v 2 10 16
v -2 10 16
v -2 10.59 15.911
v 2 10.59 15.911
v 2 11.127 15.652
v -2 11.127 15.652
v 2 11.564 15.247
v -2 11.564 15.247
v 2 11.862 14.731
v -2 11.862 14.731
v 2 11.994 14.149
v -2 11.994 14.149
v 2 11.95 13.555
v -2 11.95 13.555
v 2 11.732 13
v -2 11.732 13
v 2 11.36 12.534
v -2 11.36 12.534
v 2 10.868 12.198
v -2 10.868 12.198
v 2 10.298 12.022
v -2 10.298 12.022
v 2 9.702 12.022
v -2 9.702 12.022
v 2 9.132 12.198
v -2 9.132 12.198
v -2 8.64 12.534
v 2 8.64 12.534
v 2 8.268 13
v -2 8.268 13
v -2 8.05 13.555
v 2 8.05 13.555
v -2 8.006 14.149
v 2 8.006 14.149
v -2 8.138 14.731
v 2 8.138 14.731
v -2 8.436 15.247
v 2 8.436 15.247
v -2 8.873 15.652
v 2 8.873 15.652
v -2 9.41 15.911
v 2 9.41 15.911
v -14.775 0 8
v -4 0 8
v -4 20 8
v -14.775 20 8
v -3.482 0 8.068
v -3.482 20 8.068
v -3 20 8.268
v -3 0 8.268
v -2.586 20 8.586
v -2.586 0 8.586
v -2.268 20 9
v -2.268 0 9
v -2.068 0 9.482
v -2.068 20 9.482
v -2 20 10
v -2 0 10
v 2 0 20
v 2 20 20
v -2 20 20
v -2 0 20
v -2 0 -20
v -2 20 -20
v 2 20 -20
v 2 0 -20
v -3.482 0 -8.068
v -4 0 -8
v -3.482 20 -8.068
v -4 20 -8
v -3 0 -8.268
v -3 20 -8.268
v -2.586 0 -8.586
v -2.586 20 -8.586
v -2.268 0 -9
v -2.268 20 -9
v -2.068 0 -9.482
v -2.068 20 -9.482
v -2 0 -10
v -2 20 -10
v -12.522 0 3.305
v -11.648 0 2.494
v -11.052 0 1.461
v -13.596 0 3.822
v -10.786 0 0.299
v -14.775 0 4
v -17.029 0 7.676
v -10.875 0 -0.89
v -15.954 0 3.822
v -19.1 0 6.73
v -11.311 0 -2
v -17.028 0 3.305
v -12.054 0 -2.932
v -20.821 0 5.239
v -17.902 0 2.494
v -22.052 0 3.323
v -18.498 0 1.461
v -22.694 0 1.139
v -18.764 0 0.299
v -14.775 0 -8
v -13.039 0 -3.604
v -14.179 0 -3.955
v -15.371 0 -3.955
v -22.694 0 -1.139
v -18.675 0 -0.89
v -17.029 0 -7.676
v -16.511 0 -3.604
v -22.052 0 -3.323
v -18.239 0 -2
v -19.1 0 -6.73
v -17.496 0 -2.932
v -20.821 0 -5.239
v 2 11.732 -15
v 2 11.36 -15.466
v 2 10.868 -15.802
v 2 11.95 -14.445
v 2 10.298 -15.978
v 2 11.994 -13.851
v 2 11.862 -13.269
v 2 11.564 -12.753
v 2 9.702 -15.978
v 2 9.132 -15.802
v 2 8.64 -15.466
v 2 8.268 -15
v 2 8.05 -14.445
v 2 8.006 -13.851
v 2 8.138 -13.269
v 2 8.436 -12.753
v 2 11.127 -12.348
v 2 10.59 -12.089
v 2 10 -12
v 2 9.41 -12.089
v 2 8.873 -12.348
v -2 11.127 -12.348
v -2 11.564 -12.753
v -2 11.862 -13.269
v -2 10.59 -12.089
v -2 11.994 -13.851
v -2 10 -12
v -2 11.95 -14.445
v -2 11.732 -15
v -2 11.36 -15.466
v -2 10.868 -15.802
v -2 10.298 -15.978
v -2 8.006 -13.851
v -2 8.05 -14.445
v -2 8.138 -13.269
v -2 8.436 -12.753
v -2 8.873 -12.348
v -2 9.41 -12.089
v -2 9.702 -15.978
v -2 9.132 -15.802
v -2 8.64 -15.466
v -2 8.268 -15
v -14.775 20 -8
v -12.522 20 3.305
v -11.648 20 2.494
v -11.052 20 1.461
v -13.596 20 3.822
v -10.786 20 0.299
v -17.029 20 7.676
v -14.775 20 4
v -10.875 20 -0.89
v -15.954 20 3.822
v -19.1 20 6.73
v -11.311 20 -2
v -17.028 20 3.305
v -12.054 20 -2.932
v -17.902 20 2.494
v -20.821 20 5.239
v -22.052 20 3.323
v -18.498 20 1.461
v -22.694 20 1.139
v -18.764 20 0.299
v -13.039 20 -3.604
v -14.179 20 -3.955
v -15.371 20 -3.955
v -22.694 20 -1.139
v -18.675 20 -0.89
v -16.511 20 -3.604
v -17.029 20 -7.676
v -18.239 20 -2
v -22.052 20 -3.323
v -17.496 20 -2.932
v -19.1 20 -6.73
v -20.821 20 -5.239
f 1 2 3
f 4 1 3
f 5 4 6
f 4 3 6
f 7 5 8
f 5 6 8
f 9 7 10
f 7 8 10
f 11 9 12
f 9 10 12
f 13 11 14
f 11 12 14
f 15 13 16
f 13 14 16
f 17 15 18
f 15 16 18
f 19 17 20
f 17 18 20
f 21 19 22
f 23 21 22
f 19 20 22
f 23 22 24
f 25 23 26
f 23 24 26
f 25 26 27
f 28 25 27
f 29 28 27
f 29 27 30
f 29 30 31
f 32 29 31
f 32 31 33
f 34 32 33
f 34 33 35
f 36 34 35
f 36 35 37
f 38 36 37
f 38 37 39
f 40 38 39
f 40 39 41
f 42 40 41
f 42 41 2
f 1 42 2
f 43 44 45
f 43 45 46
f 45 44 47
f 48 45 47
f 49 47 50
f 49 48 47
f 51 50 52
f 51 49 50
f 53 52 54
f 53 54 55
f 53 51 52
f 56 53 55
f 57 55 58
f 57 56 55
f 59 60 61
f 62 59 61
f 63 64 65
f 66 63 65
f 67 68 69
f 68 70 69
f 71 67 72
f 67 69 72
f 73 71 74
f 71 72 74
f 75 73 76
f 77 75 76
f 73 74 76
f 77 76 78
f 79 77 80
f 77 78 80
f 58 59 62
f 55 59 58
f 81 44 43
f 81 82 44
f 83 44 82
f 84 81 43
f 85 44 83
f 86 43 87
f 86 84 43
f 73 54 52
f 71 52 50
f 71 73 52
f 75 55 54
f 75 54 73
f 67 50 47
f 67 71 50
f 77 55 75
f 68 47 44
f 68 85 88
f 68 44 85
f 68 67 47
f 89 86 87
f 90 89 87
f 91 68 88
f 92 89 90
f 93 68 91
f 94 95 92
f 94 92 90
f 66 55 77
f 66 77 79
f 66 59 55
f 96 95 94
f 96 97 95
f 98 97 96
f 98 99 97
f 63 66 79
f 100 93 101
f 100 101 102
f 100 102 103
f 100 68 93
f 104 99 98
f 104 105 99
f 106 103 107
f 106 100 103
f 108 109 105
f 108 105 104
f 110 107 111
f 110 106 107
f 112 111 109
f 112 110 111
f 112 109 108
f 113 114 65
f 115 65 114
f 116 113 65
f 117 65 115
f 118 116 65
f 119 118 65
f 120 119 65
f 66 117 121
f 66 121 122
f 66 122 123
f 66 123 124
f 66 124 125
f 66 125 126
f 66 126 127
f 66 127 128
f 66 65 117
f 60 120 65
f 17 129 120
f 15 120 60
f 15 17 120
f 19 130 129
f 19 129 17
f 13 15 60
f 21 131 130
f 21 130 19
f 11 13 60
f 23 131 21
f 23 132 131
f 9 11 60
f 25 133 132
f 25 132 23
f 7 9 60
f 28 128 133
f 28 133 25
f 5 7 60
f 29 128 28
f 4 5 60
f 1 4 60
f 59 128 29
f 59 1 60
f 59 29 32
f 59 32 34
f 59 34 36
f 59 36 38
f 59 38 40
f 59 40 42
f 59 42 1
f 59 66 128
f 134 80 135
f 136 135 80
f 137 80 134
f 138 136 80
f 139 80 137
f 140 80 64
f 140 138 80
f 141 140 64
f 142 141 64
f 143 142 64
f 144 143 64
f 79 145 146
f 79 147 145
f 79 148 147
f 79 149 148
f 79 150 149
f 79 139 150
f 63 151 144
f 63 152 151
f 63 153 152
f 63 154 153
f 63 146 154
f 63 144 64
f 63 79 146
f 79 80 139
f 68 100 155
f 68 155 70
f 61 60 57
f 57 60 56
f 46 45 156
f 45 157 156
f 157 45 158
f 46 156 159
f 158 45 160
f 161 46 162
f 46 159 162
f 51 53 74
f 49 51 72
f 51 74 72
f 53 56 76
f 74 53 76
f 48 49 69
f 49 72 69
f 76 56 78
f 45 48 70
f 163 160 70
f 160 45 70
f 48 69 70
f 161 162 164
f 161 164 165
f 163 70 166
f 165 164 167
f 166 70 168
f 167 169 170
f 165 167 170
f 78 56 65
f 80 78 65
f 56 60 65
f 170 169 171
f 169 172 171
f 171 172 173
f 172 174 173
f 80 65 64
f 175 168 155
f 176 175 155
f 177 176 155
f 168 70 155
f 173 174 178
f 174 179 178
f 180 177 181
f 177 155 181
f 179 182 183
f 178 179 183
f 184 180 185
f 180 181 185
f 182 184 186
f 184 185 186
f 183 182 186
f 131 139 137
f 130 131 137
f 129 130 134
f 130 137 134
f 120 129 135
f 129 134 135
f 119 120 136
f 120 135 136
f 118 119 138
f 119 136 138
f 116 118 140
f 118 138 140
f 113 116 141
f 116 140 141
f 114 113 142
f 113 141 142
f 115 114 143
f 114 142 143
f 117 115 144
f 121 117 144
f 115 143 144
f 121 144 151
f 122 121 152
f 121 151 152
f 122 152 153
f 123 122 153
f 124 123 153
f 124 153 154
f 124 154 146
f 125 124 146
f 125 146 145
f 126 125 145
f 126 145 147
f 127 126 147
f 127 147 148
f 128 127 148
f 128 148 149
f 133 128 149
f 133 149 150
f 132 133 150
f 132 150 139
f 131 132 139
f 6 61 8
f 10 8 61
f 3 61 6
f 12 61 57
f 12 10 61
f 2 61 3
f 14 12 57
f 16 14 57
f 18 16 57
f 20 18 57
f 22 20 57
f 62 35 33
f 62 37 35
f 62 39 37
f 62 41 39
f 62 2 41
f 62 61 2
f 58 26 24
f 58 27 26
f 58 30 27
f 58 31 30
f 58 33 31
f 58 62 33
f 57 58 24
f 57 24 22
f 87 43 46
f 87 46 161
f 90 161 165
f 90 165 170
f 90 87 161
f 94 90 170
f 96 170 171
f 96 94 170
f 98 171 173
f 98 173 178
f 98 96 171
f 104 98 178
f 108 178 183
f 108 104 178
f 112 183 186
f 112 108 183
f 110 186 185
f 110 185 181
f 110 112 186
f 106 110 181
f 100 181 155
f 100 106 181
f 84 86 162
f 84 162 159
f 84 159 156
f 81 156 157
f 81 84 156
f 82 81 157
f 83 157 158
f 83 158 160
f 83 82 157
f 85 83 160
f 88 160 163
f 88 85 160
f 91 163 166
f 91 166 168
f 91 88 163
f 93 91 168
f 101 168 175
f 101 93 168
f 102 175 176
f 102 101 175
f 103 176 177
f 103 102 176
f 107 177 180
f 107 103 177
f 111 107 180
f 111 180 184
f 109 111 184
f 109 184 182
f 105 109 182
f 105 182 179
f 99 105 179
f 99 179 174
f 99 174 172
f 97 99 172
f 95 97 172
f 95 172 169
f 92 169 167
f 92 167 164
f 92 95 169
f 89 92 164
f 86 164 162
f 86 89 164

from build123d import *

# Parameters (mm, degrees)
SKETCH1_R           = 4
BOSS_EXTRUDE1_DEPTH = 20
SKETCH2_R           = 2
CUT_EXTRUDE1_DEPTH  = 20
FILLET1_R           = 2


with BuildPart() as part:
    # Sketch1 → Boss-Extrude1 (new body)
    with BuildSketch(Plane(origin=(0, 0, 0), x_dir=(1, 0, 0), z_dir=(0, 1, 0))):
        with BuildLine():
            Line((-14.775, 8), (-2, 8))
            Line((-2, 8), (-2, 20))
            Line((-2, 20), (2, 20))
            Line((2, 20), (2, -20))
            Line((2, -20), (-2, -20))
            Line((-2, -20), (-2, -8))
            Line((-2, -8), (-14.775, -8))
            ThreePointArc((-14.775, -8), (-22.775, 0), (-14.775, 8))
        make_face()
        with Locations(Location((-14.775, 0, 0), (0, 0, 270))):
            Circle(SKETCH1_R, mode=Mode.SUBTRACT)
    extrude(amount=BOSS_EXTRUDE1_DEPTH)

    # Sketch2 → Cut-Extrude1 (cut)
    with BuildSketch(Plane.ZY.offset(2)):
        with Locations((-14, 10)):
            Circle(SKETCH2_R)
        with Locations((14, 10)):
            Circle(SKETCH2_R)
    extrude(amount=-CUT_EXTRUDE1_DEPTH, mode=Mode.SUBTRACT)

    # Fillet1
    fillet1_edges = [part.edges().sort_by_distance(p)[0] for p in [
        (-2, 10, 8),
        (-2, 10, -8),
    ]]
    fillet(fillet1_edges, radius=FILLET1_R)


solid = part.part
